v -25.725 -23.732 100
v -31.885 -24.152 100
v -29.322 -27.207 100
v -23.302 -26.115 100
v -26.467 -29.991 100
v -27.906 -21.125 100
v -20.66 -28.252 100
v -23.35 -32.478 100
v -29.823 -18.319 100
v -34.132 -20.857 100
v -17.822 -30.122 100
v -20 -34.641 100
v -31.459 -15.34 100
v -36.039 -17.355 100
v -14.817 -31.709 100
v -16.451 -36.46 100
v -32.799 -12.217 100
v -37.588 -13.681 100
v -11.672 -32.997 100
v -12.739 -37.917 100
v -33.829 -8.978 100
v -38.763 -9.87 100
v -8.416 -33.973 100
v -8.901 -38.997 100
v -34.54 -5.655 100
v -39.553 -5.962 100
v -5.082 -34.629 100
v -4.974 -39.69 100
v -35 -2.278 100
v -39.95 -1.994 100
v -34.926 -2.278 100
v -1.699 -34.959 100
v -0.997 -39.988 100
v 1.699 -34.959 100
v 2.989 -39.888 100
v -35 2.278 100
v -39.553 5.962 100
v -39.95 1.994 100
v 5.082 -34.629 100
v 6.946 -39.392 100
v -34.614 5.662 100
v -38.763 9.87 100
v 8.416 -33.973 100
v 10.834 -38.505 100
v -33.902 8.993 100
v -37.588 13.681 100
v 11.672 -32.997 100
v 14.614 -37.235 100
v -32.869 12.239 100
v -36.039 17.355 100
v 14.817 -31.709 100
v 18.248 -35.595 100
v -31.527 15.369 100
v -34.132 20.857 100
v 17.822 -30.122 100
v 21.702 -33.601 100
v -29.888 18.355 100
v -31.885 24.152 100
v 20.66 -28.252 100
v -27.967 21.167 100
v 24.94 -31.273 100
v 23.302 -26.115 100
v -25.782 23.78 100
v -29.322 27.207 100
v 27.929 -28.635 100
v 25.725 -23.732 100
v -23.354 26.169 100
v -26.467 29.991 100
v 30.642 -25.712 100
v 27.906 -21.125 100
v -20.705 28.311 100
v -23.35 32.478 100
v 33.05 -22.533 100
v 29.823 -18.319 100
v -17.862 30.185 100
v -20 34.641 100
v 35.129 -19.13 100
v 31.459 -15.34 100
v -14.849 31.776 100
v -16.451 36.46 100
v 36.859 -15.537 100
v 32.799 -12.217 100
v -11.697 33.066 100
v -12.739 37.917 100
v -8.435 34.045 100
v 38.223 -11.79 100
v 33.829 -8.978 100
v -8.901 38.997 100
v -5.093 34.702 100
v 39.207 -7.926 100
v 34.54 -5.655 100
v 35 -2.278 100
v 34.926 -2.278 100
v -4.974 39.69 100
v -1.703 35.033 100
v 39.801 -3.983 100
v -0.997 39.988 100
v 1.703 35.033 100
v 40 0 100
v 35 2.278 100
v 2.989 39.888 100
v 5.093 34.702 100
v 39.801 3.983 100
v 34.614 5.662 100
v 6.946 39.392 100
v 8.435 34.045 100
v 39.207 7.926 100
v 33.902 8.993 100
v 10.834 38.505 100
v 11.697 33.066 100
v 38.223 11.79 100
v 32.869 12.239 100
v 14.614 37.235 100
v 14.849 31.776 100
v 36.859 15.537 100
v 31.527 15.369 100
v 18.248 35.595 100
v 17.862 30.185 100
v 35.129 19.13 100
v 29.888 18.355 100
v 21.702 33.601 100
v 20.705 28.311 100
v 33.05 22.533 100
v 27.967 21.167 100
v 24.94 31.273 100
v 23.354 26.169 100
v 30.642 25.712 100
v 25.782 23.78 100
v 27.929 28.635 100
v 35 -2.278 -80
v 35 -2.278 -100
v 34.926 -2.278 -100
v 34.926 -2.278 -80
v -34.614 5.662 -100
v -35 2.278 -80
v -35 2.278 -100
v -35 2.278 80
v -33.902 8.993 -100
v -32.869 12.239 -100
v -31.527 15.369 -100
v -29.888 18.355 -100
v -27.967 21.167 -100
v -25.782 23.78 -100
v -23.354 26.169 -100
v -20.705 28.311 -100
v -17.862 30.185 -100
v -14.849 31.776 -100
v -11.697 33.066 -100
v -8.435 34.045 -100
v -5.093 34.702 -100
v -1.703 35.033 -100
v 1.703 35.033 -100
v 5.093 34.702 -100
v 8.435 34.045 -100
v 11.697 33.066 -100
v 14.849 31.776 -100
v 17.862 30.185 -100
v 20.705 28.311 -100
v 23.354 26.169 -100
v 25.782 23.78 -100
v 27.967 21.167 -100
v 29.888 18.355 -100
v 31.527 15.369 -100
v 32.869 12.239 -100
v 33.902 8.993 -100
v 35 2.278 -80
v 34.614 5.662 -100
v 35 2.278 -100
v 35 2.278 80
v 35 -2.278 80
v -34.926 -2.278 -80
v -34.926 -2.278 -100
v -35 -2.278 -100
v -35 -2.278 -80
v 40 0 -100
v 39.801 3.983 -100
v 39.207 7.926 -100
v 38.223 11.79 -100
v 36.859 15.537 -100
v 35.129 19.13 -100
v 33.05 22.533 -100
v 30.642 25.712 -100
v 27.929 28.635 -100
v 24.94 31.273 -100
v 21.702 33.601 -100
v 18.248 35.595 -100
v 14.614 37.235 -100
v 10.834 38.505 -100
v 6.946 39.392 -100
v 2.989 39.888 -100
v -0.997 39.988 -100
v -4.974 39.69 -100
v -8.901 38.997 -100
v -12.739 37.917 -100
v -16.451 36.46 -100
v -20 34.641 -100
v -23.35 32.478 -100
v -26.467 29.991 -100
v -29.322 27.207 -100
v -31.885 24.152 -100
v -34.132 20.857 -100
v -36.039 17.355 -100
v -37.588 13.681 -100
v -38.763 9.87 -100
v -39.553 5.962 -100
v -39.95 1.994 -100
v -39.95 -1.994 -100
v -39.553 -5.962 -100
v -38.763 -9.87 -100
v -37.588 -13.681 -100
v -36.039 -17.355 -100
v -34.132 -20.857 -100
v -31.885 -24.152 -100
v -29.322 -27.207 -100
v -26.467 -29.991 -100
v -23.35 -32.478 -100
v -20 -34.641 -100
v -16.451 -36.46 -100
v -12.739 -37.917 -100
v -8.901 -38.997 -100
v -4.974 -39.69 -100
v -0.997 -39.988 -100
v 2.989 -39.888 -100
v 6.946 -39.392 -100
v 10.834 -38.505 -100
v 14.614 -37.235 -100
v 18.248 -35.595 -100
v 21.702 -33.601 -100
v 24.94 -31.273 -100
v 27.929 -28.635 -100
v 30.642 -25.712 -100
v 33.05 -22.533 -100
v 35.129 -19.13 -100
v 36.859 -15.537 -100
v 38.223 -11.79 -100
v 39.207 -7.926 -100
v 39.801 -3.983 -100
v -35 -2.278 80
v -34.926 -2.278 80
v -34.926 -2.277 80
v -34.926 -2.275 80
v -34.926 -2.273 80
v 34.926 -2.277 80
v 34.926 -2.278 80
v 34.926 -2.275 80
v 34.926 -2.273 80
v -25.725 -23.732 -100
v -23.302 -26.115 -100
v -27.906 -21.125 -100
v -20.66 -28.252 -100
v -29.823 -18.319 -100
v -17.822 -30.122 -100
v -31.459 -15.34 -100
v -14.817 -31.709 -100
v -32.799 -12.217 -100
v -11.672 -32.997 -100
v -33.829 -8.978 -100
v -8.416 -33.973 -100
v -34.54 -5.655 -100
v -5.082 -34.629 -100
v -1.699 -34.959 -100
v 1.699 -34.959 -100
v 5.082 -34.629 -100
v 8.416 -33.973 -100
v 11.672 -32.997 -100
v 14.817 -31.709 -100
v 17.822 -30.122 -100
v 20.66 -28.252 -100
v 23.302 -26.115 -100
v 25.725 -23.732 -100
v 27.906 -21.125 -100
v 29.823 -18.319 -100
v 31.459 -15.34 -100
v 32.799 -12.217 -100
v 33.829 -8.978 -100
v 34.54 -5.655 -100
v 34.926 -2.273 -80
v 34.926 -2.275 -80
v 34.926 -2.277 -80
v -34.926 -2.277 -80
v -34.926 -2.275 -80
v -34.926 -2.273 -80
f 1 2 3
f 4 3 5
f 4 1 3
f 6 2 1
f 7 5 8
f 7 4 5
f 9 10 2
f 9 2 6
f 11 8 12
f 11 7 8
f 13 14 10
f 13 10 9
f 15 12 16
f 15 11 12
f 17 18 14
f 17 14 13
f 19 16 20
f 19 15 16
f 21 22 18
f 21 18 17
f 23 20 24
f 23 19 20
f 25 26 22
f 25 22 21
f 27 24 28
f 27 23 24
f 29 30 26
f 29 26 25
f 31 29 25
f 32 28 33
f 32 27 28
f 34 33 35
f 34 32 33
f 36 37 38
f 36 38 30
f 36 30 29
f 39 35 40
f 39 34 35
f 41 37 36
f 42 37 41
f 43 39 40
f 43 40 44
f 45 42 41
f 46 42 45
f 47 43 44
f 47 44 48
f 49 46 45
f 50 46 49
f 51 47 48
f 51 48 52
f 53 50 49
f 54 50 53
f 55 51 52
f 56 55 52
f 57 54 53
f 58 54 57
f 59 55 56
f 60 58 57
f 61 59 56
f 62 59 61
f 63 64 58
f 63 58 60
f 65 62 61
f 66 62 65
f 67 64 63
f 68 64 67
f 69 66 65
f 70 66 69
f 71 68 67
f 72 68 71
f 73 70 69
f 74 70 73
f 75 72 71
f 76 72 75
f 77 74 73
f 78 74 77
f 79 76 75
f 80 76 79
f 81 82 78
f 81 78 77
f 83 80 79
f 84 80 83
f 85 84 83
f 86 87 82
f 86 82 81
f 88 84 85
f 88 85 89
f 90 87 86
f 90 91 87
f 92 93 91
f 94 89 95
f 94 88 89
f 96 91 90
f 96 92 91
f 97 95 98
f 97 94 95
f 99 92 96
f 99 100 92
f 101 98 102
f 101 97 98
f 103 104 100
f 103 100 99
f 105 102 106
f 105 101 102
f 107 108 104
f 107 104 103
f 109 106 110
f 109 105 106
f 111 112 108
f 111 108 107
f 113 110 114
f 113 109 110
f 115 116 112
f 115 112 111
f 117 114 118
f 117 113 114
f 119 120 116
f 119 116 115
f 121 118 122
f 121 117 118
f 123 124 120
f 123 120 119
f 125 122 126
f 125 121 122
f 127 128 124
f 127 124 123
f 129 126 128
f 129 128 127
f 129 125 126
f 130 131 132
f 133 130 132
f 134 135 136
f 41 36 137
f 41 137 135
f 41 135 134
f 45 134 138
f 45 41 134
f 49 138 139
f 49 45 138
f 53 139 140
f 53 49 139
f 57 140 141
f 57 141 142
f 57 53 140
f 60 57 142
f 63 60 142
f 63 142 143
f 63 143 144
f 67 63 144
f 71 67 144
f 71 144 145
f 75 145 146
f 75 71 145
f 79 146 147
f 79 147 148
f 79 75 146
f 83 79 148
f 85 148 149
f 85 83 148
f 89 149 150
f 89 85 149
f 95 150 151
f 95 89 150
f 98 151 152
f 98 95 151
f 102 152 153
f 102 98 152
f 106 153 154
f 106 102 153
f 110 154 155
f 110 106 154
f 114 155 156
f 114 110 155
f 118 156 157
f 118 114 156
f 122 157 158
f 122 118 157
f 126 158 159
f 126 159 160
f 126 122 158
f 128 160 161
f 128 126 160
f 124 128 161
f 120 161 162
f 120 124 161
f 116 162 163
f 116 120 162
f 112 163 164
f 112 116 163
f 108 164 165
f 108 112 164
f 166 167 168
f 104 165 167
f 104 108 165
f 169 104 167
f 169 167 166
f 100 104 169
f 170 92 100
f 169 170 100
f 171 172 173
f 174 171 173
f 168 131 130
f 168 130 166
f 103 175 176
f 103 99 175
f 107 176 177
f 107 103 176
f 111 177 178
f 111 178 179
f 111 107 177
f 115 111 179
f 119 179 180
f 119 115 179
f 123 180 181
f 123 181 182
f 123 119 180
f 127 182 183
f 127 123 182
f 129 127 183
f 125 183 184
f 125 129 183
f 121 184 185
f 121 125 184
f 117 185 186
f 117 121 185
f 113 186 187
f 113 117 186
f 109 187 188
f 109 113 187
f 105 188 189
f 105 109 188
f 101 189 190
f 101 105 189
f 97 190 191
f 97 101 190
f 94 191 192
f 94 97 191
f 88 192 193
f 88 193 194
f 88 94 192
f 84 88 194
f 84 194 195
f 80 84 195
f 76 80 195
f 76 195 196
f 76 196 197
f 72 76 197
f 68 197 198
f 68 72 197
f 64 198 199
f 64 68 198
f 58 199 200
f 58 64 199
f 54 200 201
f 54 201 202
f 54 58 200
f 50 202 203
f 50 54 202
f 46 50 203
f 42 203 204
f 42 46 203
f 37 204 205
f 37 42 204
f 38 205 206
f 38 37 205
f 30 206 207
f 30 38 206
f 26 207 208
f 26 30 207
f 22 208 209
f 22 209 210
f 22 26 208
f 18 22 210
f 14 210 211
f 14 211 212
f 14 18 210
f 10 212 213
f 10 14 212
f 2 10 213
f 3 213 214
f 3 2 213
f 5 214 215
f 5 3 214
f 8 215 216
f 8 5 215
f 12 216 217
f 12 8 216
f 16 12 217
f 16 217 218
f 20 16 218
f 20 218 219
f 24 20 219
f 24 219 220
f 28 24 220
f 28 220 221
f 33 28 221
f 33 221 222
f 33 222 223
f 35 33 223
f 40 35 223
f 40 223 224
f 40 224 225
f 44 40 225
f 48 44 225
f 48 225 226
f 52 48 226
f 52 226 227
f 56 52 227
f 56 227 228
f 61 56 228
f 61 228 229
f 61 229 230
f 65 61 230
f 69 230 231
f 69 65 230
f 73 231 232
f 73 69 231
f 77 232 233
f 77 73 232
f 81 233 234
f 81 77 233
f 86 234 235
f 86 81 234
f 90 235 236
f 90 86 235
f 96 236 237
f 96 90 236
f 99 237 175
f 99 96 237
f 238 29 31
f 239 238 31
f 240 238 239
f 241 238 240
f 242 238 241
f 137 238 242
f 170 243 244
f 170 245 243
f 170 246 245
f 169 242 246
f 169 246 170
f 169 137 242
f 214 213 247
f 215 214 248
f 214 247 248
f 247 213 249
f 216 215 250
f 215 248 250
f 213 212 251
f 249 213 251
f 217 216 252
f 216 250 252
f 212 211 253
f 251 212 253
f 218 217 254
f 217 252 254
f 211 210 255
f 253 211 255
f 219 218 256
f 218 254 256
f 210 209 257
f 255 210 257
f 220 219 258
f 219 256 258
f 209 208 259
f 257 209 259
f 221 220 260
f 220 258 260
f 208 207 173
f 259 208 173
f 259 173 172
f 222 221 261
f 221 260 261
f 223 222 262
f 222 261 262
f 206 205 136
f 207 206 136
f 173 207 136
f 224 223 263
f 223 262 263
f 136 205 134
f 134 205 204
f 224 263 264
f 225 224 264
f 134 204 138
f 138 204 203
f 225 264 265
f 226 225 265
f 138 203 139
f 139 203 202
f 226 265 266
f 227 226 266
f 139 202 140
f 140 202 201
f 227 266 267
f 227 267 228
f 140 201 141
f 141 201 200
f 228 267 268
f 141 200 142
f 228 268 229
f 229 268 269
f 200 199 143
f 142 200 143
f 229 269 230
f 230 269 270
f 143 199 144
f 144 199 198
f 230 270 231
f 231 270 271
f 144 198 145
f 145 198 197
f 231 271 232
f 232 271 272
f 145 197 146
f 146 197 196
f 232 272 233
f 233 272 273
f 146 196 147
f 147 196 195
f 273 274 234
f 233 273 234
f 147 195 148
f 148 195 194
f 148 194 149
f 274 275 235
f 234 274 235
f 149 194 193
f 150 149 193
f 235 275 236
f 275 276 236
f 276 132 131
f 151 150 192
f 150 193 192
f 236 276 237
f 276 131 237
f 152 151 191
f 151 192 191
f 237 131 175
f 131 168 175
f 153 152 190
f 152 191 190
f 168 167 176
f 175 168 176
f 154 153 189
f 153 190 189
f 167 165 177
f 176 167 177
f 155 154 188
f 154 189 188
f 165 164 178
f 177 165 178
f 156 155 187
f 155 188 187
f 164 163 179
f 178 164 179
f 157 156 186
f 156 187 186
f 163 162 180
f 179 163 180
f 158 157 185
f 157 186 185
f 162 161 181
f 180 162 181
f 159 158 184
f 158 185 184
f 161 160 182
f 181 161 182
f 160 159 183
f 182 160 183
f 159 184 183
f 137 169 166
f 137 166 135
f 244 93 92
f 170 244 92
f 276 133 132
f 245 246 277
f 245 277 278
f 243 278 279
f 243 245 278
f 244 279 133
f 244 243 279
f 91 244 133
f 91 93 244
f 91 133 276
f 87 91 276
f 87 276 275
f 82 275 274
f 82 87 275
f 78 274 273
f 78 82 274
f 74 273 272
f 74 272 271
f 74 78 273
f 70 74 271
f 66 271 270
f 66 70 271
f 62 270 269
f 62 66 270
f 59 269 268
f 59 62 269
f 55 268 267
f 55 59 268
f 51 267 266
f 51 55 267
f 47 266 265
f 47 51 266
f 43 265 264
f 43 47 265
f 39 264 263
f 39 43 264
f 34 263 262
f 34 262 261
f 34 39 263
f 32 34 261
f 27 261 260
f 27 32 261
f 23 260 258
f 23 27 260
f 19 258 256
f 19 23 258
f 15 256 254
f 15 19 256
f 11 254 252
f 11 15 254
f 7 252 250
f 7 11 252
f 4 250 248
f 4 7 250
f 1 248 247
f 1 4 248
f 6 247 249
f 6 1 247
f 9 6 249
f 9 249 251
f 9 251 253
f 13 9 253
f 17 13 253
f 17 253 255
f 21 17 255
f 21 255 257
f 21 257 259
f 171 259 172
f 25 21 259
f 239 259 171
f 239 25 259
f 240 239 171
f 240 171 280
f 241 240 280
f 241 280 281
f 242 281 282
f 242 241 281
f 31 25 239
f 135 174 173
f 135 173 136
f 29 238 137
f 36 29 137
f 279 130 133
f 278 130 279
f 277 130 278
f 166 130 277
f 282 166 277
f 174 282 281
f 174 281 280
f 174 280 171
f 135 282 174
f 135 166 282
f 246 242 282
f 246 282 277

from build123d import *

# Parameters (mm, degrees)
SKETCH2_R           = 40
BOSS_EXTRUDE1_DEPTH = 100
SKETCH4_W           = 70
SKETCH4_H           = 4.556359802
CUT_EXTRUDE1_DEPTH  = 20
SKETCH5_W           = 70
SKETCH5_H           = 4.556359802
CUT_EXTRUDE2_DEPTH  = 20


with BuildPart() as part:
    # Sketch2 → Boss-Extrude1 (new, symmetric)
    with BuildSketch(Plane.XY):
        Circle(SKETCH2_R)
        with BuildLine():
            ThreePointArc((34.926090435, -2.273369064), (0, -35), (-34.926090435, -2.273369064))
            Line((-34.926090435, -2.273369064), (34.926090435, -2.273369064))
        make_face(mode=Mode.SUBTRACT)
        with BuildLine():
            Line((35, 2.278179901), (-35, 2.278179901))
            ThreePointArc((-35, 2.278179901), (0, 35.07406597), (35, 2.278179901))
        make_face(mode=Mode.SUBTRACT)
    extrude(amount=BOSS_EXTRUDE1_DEPTH, both=True)

    # Sketch4 → Cut-Extrude1 (cut)
    with BuildSketch(Plane.XY.offset(100)):
        Rectangle(SKETCH4_W, SKETCH4_H)
    extrude(amount=-CUT_EXTRUDE1_DEPTH, mode=Mode.SUBTRACT)

    # Sketch5 → Cut-Extrude2 (cut)
    with BuildSketch(Plane(origin=(0, 0, -100), x_dir=(-1, 0, 0), z_dir=(0, 0, -1))):
        Rectangle(SKETCH5_W, SKETCH5_H)
    extrude(amount=-CUT_EXTRUDE2_DEPTH, mode=Mode.SUBTRACT)


solid = part.part
